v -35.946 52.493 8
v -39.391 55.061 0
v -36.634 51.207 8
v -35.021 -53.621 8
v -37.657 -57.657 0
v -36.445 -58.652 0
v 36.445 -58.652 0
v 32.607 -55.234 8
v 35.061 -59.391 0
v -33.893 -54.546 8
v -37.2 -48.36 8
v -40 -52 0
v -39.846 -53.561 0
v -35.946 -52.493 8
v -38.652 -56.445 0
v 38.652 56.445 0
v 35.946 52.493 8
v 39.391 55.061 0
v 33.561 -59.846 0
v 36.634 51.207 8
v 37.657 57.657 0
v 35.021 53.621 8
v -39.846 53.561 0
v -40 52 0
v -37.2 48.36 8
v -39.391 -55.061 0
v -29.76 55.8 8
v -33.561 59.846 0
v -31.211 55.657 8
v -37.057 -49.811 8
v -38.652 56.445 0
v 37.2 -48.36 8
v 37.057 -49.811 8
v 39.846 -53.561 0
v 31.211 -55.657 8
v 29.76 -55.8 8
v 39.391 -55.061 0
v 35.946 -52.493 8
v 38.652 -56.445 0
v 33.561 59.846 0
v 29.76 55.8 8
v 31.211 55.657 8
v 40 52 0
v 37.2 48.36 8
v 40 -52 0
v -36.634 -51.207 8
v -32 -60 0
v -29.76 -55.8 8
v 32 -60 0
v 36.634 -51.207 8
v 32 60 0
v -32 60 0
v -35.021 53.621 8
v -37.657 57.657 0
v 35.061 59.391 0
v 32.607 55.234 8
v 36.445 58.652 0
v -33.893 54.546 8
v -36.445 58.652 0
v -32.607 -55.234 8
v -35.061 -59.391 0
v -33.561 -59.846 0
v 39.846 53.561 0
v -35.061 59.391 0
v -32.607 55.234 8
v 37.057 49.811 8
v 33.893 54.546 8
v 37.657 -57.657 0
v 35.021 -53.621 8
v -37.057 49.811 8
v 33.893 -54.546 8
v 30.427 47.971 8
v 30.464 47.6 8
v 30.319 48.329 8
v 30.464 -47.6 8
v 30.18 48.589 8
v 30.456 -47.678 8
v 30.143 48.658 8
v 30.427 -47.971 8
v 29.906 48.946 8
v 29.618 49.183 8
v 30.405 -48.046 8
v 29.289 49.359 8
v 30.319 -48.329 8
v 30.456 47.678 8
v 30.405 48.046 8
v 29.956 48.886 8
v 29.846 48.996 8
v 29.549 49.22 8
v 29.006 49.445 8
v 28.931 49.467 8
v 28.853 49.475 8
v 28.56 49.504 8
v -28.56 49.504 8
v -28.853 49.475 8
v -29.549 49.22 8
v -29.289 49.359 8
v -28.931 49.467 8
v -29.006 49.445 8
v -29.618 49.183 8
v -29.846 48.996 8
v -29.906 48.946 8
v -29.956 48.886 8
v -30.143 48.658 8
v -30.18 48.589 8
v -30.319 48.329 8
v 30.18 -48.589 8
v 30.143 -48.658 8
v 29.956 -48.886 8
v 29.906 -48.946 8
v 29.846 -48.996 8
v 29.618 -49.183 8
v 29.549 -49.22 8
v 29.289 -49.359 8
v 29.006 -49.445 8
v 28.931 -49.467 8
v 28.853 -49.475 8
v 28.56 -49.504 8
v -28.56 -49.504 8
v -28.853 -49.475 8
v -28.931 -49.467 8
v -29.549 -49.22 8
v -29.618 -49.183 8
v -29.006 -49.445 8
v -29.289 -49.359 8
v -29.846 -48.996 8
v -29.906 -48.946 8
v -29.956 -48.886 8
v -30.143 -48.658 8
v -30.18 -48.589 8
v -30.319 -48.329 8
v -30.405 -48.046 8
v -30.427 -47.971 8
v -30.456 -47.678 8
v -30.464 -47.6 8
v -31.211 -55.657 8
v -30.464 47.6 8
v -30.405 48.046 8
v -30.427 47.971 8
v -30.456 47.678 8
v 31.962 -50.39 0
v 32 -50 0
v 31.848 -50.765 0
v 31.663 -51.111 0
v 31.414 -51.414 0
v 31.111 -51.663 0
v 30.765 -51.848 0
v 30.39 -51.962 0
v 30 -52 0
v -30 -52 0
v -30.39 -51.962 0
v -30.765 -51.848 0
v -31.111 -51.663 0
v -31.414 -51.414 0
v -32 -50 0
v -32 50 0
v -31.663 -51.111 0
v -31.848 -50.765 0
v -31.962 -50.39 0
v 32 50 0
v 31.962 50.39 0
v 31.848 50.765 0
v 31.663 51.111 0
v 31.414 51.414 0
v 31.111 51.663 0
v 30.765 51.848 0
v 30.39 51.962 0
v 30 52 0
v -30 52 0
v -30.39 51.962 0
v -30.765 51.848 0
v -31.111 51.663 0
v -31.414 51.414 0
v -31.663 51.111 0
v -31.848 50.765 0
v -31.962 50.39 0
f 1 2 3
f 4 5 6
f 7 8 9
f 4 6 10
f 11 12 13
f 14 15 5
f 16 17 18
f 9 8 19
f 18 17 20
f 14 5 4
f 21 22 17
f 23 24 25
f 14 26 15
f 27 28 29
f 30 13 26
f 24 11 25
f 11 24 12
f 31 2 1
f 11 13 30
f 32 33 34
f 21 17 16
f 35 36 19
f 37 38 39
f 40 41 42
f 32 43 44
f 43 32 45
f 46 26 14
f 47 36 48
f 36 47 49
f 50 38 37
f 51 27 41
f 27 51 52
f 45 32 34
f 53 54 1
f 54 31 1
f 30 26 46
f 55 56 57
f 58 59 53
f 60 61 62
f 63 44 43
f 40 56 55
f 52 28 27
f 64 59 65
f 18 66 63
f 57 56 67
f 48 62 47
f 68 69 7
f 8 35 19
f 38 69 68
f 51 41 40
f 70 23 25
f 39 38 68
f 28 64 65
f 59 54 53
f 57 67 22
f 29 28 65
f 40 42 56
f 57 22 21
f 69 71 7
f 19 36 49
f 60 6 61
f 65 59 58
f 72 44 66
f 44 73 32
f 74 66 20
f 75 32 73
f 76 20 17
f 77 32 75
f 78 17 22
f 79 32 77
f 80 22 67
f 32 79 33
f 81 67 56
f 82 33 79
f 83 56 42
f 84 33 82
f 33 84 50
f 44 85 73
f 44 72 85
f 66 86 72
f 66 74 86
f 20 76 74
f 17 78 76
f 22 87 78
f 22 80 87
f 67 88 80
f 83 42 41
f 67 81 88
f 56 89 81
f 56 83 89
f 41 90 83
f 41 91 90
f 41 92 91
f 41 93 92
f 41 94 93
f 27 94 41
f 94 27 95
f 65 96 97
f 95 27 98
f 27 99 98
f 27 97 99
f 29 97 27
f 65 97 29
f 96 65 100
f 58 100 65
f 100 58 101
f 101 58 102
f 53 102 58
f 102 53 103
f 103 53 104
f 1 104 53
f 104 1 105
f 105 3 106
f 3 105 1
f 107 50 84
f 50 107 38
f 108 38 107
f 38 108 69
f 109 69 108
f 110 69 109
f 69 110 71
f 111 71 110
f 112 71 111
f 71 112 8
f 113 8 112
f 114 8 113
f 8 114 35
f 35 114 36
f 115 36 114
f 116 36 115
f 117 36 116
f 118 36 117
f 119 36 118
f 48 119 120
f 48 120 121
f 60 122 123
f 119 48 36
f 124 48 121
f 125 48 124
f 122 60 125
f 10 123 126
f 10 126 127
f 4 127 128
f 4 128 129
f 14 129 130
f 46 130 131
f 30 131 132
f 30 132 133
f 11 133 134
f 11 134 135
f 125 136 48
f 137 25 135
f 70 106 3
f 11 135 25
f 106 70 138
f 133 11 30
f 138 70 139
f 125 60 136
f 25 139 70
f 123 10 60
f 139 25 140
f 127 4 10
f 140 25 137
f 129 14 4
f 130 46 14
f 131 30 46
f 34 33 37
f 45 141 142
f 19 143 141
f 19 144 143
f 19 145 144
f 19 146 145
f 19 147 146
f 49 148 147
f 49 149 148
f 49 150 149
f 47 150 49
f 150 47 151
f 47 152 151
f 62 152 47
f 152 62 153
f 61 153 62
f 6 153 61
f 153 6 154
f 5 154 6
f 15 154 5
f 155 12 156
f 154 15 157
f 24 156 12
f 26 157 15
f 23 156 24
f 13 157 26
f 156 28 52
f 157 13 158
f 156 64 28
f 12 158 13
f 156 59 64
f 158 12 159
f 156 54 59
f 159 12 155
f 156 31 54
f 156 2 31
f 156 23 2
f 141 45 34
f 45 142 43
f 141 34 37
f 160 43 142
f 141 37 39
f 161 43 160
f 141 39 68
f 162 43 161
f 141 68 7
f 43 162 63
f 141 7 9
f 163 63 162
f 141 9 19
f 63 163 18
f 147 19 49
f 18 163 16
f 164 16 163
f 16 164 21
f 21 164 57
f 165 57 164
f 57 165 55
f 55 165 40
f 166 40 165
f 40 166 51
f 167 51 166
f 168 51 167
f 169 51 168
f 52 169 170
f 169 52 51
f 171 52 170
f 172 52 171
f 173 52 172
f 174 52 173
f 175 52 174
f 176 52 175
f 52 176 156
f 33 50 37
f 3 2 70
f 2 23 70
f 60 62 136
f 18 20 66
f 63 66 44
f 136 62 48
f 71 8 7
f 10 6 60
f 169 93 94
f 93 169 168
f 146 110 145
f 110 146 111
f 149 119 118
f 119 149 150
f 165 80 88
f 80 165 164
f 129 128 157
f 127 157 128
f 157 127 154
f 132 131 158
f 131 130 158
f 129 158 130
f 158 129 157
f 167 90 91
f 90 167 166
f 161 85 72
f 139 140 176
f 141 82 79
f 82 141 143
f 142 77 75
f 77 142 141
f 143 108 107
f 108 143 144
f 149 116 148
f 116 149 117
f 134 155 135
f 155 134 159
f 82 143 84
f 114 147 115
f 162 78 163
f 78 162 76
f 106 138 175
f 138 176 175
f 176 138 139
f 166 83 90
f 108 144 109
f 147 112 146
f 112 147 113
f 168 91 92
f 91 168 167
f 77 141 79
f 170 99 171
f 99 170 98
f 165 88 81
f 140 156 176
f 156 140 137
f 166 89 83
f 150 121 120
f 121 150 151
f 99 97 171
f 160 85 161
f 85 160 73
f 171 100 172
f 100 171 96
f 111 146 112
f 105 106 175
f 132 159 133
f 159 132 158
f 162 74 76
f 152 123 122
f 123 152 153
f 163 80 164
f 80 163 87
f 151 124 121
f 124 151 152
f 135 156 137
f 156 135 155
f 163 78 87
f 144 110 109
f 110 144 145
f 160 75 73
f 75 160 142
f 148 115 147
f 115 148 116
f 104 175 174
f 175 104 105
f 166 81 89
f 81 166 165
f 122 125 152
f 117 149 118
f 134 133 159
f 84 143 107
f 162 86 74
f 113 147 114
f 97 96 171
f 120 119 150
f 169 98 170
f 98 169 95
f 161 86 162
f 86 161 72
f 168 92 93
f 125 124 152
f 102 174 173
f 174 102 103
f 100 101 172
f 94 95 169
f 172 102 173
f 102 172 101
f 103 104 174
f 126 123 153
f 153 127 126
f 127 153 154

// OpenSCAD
$fn = 32;

// ----------------------------------------------------------------------
// Display bezel: 80 x 120 mm frame, opening 64x104 mm
// ----------------------------------------------------------------------

// --- parameters (mm) ---
length = 80;              // frame outside length, X
width = 120;              // frame outside width, Y
frame_w = 8;              // frame width
thickness = 8;            // frame thickness
corner_r = 8;             // outside corner radius
chamfer = 0.93;           // outer wall taper
funnel = 0.94;            // inner opening taper
opening_l = 64;           // opening length
opening_w = 104;          // opening width
inner_r = 2;              // opening corner radius

/* rounded-rectangle outlines, generated with loops */
module rounded_ring(l_nom, w_nom, r) {
  hull() {
    for (sx = [-1, 1]) for (sy = [-1, 1])
      translate([sx * (l_nom / 2 - r), sy * (w_nom / 2 - r)]) circle(r = r);
  }
}

difference() {
  /* frame body, drafted so the outer edge is a variable-depth chamfer */
  linear_extrude(height = thickness, scale = chamfer)
    rounded_ring(length, width, corner_r);
  /* viewing opening, drafted the other way for a funnel edge */
  linear_extrude(height = thickness + 2, scale = funnel)
    translate([0, 0, -1]) rounded_ring(opening_l, opening_w, inner_r);
}
